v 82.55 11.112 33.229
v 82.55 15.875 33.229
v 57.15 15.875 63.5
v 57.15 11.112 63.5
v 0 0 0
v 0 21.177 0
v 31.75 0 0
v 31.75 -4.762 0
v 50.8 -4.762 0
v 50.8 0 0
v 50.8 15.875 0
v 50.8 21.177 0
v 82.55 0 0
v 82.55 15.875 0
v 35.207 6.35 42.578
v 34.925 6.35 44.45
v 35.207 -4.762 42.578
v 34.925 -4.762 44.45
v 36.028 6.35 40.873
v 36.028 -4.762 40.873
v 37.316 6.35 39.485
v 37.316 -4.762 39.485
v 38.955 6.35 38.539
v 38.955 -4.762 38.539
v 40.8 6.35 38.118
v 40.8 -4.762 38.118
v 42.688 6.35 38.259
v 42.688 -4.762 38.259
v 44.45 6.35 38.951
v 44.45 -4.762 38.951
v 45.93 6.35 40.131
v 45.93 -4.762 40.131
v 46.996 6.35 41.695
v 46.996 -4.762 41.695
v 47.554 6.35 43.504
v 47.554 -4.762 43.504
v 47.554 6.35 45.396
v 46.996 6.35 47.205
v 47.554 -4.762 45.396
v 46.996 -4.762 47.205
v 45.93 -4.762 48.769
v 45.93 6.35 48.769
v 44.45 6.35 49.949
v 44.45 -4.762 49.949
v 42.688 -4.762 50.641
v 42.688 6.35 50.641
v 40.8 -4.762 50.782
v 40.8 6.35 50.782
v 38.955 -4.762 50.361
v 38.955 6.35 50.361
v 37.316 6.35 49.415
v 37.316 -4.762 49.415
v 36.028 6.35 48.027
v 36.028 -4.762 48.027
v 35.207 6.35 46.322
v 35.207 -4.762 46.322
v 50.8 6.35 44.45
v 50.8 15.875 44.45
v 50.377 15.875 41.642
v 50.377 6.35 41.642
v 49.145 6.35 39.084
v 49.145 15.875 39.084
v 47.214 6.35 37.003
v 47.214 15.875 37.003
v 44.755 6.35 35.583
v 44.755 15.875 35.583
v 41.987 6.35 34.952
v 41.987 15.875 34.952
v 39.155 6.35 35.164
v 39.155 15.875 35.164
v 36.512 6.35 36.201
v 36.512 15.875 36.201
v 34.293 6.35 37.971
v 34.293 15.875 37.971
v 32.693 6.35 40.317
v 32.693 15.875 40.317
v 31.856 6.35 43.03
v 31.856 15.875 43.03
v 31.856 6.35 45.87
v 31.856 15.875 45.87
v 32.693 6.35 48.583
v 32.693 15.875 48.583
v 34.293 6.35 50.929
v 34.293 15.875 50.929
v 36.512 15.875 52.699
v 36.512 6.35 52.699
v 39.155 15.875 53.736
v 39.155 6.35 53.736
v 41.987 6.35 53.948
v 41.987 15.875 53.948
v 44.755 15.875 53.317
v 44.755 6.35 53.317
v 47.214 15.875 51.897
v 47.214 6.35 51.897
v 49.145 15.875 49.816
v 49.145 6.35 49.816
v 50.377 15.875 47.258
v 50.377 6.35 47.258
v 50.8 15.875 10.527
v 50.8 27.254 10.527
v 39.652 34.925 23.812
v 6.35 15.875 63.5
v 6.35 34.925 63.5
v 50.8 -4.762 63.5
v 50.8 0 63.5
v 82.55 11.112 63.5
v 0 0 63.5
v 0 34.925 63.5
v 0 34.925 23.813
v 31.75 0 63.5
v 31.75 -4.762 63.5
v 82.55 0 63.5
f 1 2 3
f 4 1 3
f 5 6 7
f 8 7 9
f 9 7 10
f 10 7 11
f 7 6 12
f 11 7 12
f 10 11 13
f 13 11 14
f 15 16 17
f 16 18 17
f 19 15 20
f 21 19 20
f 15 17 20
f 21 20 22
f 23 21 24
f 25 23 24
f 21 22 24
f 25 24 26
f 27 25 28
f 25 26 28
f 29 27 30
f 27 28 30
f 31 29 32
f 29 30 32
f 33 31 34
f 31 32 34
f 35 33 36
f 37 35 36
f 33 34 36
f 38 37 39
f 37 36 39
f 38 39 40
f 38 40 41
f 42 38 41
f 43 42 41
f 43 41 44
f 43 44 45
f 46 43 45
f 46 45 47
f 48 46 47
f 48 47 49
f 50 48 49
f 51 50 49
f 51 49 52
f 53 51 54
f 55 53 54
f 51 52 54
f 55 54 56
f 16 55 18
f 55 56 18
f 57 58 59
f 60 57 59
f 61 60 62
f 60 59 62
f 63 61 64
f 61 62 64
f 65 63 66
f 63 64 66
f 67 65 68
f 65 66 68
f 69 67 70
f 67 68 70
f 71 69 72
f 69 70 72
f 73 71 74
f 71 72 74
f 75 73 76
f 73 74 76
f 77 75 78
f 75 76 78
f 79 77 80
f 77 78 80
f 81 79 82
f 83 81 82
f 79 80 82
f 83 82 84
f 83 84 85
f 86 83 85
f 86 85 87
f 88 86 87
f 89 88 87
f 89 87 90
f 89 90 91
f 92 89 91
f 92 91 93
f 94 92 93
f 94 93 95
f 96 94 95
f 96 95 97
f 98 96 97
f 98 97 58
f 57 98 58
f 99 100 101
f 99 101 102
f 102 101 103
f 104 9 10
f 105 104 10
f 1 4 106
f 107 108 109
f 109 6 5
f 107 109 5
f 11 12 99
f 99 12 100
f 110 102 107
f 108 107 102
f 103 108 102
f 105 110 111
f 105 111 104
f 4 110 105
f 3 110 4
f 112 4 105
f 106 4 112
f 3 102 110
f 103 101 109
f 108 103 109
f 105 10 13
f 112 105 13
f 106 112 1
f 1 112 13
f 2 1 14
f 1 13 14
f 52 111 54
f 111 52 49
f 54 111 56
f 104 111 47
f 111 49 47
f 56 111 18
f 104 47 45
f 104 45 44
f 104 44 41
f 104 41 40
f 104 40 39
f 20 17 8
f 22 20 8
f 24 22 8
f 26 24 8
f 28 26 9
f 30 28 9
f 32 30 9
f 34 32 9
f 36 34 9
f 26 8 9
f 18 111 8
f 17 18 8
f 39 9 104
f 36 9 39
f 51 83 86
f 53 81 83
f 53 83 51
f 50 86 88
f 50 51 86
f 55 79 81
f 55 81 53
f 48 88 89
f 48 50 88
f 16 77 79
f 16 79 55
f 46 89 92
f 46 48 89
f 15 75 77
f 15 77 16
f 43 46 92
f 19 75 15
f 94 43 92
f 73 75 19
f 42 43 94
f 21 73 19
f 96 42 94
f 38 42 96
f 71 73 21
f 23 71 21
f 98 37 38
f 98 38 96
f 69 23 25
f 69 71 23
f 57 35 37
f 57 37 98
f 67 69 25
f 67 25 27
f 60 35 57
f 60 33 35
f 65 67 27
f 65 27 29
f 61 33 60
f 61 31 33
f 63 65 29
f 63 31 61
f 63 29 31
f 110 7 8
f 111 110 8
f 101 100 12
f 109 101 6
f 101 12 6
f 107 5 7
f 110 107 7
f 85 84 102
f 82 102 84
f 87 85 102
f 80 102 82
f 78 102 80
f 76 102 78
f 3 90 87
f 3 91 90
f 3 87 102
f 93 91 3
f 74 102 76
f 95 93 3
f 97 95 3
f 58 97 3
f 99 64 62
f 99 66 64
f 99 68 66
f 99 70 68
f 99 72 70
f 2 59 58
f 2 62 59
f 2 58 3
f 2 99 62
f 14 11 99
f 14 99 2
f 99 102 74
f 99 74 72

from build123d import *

# Parameters (mm, degrees)
BOSS_EXTRU_1_DEPTH                               = 63.5
CHANFREIN1_SIZE                                  = 23.8125
CHANFREIN1_SIZE2                                 = 13.748153285
ENL_V_MAT_EXTRU_1_DEPTH                          = 19.05
CHAMBRAGE_POUR_VIS_T_TE_RONDE_BOMB_E_D           = 12.7
CHAMBRAGE_POUR_VIS_T_TE_RONDE_BOMB_E_CBORE_D     = 19.05
CHAMBRAGE_POUR_VIS_T_TE_RONDE_BOMB_E_CBORE_DEPTH = 9.525
ENL_V_MAT_EXTRU_2_DEPTH                          = 4.7625


with BuildPart() as part:
    # Esquisse1 → Boss.-Extru.1 (new body)
    with BuildSketch(Plane.XY):
        Polygon((0, 0), (31.75, 0), (31.75, -4.7625), (50.8, -4.7625), (50.8, 0), (82.55, 0), (82.55, 34.925), (0, 34.925), align=None)
    extrude(amount=BOSS_EXTRU_1_DEPTH)

    # Chanfrein1
    chanfrein1_edges = [part.edges().sort_by_distance(p)[0] for p in [
        (41.275, 34.925, 0),
    ]]
    chanfrein1_side = [part.faces().sort_by_distance(p)[0] for p in [
        (41.275, 34.925, 31.75),
    ]]
    chamfer(chanfrein1_edges, length=CHANFREIN1_SIZE, length2=CHANFREIN1_SIZE2, reference=chanfrein1_side[0])

    # Esquisse2 → Enlèv. mat.-Extru.1 (cut)
    with BuildSketch(Plane(origin=(0, 34.925, 0), x_dir=(1, 0, 0), z_dir=(0, 1, 0))):
        Polygon((50.8, 0), (50.8, -10.526552809), (6.35, -63.5), (82.55, -63.5), (82.55, 0), align=None)
    extrude(amount=-ENL_V_MAT_EXTRU_1_DEPTH, mode=Mode.SUBTRACT)

    # Chambrage pour vis à tête ronde bombée #01 (through all)
    with Locations(Plane(origin=(0, 15.875, 0), x_dir=(1, 0, 0), z_dir=(0, 1, 0))):
        with Locations((41.275, -44.45)):
            CounterBoreHole(CHAMBRAGE_POUR_VIS_T_TE_RONDE_BOMB_E_D / 2, CHAMBRAGE_POUR_VIS_T_TE_RONDE_BOMB_E_CBORE_D / 2, CHAMBRAGE_POUR_VIS_T_TE_RONDE_BOMB_E_CBORE_DEPTH)

    # Esquisse5 → Enlèv. mat.-Extru.2 (cut)
    with BuildSketch(Plane(origin=(0, 15.875, 0), x_dir=(1, 0, 0), z_dir=(0, 1, 0))):
        Polygon((57.15, -63.5), (82.55, -63.5), (82.55, -33.229458748), align=None)
    extrude(amount=-ENL_V_MAT_EXTRU_2_DEPTH, mode=Mode.SUBTRACT)


solid = part.part
